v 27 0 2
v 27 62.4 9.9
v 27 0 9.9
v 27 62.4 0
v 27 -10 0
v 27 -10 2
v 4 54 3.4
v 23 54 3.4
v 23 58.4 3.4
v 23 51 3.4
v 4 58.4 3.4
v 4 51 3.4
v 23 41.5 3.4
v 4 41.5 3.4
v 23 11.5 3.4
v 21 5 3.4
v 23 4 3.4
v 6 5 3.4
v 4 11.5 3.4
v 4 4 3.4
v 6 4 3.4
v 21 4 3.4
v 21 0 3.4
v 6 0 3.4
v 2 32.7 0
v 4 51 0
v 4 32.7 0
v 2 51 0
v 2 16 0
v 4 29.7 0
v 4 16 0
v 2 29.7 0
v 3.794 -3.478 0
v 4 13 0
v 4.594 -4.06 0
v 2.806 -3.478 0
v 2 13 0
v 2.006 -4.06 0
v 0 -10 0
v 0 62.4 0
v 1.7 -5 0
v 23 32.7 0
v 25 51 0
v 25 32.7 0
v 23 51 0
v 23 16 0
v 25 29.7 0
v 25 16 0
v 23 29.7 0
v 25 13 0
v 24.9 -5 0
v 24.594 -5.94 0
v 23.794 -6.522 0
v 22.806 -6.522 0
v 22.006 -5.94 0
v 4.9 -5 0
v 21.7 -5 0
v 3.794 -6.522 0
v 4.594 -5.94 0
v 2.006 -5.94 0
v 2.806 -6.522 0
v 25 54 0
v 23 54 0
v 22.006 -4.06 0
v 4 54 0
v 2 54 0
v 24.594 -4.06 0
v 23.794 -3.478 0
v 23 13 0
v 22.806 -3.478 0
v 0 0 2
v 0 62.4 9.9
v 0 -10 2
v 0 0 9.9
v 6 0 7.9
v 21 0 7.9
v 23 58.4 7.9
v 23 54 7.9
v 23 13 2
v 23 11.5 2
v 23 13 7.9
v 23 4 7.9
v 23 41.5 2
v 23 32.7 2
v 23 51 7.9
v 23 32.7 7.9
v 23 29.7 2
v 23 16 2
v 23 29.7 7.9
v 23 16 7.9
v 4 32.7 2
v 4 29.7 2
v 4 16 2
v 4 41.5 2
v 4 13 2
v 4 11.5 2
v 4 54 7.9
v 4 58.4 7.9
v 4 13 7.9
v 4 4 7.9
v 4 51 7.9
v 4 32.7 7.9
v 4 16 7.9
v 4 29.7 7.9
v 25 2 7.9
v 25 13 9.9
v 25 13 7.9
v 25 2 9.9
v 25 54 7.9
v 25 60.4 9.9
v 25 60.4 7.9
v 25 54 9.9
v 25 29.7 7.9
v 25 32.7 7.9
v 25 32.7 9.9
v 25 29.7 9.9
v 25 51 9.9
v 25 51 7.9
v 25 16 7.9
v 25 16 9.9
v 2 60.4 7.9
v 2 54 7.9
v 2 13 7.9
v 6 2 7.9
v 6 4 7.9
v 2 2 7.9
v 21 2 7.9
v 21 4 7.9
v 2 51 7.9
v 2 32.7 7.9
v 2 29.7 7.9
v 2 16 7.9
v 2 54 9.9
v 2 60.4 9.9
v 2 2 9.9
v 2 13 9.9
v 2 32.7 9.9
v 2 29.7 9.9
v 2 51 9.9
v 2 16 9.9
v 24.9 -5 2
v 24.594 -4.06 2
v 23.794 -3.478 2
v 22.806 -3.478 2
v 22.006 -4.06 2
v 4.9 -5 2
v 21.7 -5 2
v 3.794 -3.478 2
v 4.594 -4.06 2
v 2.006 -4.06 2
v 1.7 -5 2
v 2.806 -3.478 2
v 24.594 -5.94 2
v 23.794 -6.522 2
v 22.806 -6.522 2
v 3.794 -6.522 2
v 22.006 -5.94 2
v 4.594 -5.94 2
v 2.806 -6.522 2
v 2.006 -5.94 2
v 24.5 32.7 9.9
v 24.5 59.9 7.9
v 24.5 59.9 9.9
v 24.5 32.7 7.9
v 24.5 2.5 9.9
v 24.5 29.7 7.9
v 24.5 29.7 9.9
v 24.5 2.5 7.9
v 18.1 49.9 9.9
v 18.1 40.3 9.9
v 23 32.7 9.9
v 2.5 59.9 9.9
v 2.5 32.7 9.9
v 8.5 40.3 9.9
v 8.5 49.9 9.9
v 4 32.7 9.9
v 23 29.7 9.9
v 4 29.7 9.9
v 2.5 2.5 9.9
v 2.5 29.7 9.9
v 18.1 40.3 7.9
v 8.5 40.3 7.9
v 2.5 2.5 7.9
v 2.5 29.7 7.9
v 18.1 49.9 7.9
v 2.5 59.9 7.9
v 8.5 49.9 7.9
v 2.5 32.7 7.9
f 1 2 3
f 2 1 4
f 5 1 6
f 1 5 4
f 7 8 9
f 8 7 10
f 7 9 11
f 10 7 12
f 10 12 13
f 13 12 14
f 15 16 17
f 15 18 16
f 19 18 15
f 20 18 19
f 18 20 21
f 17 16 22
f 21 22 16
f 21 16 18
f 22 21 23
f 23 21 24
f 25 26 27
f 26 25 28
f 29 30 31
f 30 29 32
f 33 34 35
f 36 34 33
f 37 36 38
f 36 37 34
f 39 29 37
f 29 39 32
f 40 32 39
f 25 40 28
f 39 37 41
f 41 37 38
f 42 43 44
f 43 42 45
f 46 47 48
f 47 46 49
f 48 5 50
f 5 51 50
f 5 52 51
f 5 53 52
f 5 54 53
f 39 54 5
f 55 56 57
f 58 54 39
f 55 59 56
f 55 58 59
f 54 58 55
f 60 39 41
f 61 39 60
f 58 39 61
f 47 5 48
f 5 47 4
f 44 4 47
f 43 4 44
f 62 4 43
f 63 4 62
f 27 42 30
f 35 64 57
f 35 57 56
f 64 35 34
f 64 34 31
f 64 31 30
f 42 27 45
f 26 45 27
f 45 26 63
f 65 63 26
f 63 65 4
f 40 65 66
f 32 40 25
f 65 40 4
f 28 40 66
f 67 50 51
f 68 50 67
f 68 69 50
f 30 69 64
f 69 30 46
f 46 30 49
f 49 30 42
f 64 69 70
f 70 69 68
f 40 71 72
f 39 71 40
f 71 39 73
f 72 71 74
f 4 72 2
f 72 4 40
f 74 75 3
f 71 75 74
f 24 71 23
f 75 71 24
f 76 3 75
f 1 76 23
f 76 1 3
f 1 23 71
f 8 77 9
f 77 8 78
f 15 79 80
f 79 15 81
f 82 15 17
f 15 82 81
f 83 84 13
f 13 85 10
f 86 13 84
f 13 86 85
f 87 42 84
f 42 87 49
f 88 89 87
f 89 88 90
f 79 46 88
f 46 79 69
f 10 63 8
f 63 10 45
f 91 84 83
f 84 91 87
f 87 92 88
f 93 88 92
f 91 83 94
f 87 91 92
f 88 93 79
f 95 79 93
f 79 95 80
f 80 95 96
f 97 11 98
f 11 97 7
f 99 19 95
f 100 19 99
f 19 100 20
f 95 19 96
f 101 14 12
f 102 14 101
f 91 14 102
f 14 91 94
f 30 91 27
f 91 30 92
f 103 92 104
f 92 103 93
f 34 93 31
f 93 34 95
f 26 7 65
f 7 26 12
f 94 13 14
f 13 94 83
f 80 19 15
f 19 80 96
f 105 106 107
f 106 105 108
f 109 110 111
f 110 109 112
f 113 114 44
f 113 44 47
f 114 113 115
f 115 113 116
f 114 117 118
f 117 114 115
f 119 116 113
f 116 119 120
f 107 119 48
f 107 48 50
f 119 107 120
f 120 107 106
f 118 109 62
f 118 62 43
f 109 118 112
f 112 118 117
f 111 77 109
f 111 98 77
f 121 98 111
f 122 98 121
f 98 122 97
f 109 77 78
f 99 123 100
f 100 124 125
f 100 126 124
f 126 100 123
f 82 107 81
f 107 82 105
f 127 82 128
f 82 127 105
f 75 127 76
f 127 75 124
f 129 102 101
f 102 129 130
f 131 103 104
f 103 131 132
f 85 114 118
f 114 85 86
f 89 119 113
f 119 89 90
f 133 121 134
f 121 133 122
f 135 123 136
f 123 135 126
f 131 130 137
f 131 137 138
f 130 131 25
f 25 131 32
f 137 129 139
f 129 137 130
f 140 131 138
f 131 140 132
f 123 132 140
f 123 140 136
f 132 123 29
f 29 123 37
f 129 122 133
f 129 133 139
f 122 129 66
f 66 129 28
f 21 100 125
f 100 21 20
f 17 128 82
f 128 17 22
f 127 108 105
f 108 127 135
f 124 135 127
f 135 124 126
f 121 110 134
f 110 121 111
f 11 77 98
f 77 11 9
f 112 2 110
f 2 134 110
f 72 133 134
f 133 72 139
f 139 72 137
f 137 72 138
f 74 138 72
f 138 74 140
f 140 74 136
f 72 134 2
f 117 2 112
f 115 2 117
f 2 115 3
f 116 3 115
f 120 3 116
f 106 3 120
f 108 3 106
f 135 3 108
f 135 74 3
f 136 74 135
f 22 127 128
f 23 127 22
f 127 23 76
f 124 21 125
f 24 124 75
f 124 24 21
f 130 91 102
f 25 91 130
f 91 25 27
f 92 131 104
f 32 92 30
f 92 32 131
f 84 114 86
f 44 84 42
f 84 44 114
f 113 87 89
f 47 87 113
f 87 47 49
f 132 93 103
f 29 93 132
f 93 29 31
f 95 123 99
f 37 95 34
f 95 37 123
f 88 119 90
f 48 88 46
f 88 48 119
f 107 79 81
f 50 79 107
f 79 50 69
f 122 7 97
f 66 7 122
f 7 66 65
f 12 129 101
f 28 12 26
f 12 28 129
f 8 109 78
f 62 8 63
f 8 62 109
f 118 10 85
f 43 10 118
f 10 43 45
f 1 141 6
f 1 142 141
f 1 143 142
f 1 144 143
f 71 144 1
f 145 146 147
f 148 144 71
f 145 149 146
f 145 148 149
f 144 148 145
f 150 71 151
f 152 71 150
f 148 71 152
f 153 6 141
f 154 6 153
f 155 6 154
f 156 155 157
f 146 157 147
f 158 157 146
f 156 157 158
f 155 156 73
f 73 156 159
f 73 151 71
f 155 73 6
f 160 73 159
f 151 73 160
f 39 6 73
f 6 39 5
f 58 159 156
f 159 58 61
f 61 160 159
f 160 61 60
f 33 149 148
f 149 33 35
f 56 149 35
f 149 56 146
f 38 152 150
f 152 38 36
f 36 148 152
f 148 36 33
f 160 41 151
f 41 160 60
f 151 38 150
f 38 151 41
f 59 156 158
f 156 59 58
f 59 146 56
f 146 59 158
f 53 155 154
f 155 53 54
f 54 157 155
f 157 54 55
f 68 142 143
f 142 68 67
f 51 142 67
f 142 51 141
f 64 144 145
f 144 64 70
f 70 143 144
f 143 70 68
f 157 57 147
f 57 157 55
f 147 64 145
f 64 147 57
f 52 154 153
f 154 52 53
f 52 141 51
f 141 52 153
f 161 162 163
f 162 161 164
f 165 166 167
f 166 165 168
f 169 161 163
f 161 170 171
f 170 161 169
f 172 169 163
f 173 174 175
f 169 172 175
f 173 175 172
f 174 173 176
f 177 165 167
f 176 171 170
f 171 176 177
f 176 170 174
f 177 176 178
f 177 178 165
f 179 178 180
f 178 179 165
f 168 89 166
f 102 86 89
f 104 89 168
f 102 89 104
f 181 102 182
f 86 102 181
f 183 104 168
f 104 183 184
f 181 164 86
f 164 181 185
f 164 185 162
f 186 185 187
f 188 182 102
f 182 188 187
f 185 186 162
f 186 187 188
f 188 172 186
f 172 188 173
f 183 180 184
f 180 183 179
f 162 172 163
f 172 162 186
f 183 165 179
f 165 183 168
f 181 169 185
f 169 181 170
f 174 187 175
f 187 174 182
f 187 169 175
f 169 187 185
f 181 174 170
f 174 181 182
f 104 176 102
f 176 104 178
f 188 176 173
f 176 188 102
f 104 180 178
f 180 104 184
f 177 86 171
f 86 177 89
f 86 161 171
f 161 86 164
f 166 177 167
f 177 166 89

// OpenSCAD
opi_cam_width = 19.0;
opi_cam_height = 54.4;
opi_cam_depth = 4.5;

opi_cam_bottom_depth = 1.4;
opi_cam_bottom_height = 30.0;
opi_cam_bottom_off_y = 7.5;

opi_lens_width = 8.6;
opi_lens_height = 8.6;
opi_lens_off_x = 5.0;
opi_lens_off_y = 9.0;

cable_cut_width = 15.0;
wall_size = 2.0;

cable_tie_width = 3.0;
cable_tie_height = 2.0;
cable_tie_off_1 = 9.0;
cable_tie_off_2 = 47.0;

screw_holes = 3.2;
screw_plate = 10.0;

lens_gap = 0.5;
top_gap = 0.5;

$fn = 10;

module cam() {
    cube([opi_cam_width, opi_cam_height, opi_cam_depth]);
    
    translate([opi_lens_off_x, opi_cam_height - opi_lens_height - opi_lens_off_y, opi_cam_depth])
        cube([opi_lens_width, opi_lens_height, 5]);
    
    translate([0, opi_cam_bottom_off_y, -opi_cam_bottom_depth])
        cube([opi_cam_width, opi_cam_bottom_height, opi_cam_bottom_depth]);
}

module holder_bottom_walls() {
    difference() {
        cube([opi_cam_width + (4 * wall_size), opi_cam_height + (4 * wall_size), wall_size + opi_cam_bottom_depth]);
        
        translate([2 * wall_size, (2 * wall_size) + opi_cam_bottom_off_y, wall_size])
            cube([opi_cam_width, opi_cam_bottom_height, opi_cam_bottom_depth + 1]);
    }
    
    // inner walls
    translate([wall_size, wall_size, wall_size])
        cube([opi_cam_width + (2 * wall_size), wall_size, opi_cam_depth + opi_cam_bottom_depth]);
    translate([wall_size, opi_cam_height + (2 * wall_size), wall_size])
        cube([opi_cam_width + (2 * wall_size), wall_size, opi_cam_depth + opi_cam_bottom_depth]);
    translate([wall_size, 2 * wall_size, wall_size])
        cube([wall_size, opi_cam_height, opi_cam_depth + opi_cam_bottom_depth]);
    translate([opi_cam_width + (2 * wall_size), 2 * wall_size, wall_size])
        cube([wall_size, opi_cam_height, opi_cam_depth + opi_cam_bottom_depth]);
    
    // outer walls
    translate([0, 0, wall_size])
        cube([opi_cam_width + (4 * wall_size), wall_size, opi_cam_depth + opi_cam_bottom_depth + wall_size]);
    translate([0, opi_cam_height + (3 * wall_size), wall_size])
        cube([opi_cam_width + (4 * wall_size), wall_size, opi_cam_depth + opi_cam_bottom_depth + wall_size]);
    translate([0, wall_size, wall_size])
        cube([wall_size, opi_cam_height + (2 * wall_size), opi_cam_depth + opi_cam_bottom_depth + wall_size]);
    translate([opi_cam_width + (3 * wall_size), wall_size, wall_size])
        cube([wall_size, opi_cam_height + (2 * wall_size), opi_cam_depth + opi_cam_bottom_depth + wall_size]);
}

module screws() {
    difference() {
        cube([(4 * wall_size) + opi_cam_width, screw_plate, wall_size]);
        
        translate([3.3, screw_plate / 2, -1])
            cylinder(d = screw_holes, h = wall_size + 2);
        translate([23.3, screw_plate / 2, -1])
            cylinder(d = screw_holes, h = wall_size + 2);
        //translate([13.3, screw_plate / 2, -1])
        //    cylinder(d = screw_holes, h = wall_size + 2);
        //translate([((4 * wall_size) + opi_cam_width) / 3, screw_plate / 2, -1])
        //    cylinder(d = screw_holes, h = wall_size + 2);
        //translate([((4 * wall_size) + opi_cam_width) * 2 / 3, screw_plate / 2, -1])
        //    cylinder(d = screw_holes, h = wall_size + 2);
    }
}

module holder_bottom() {
    difference() {
        holder_bottom_walls();
        
        // ribbon cable
        translate([((opi_cam_width + (4 * wall_size)) - cable_cut_width) / 2, -1, wall_size + opi_cam_bottom_depth])
            cube([cable_cut_width, (2 * wall_size) + 2, opi_cam_depth]);
        
        // cable-tie center
        translate([wall_size, ((4 * wall_size) + opi_cam_height - cable_tie_width) / 2, -1])
            cube([cable_tie_height, cable_tie_width, (3 * wall_size) + opi_cam_depth + opi_cam_bottom_depth]);
        translate([opi_cam_width + (2 * wall_size), ((4 * wall_size) + opi_cam_height - cable_tie_width) / 2, -1])
            cube([cable_tie_height, cable_tie_width, (3 * wall_size) + opi_cam_depth + opi_cam_bottom_depth]);
        
        // cable-tie bottom
        translate([wall_size, (2 * wall_size) + cable_tie_off_1, -1])
            cube([cable_tie_height, cable_tie_width, (3 * wall_size) + opi_cam_depth + opi_cam_bottom_depth]);
        translate([opi_cam_width + (2 * wall_size), (2 * wall_size) + cable_tie_off_1, -1])
            cube([cable_tie_height, cable_tie_width, (3 * wall_size) + opi_cam_depth + opi_cam_bottom_depth]);
        
        // cable-tie top
        translate([wall_size, (2 * wall_size) + cable_tie_off_2, -1])
            cube([cable_tie_height, cable_tie_width, (3 * wall_size) + opi_cam_depth + opi_cam_bottom_depth]);
        translate([opi_cam_width + (2 * wall_size), (2 * wall_size) + cable_tie_off_2, -1])
            cube([cable_tie_height, cable_tie_width, (3 * wall_size) + opi_cam_depth + opi_cam_bottom_depth]);
    }
    
    translate([0, -screw_plate, 0])
        screws();
}

module holder_top() {
    difference() {
        translate([top_gap, top_gap, 0])
            cube([opi_cam_width + (2 * wall_size) - (2 * top_gap), opi_cam_height + (2 * wall_size) - (2 * top_gap), wall_size]);
        
        // camera lens
        translate([wall_size + opi_lens_off_x - lens_gap, wall_size + opi_cam_height - opi_lens_height - opi_lens_off_y - lens_gap, -1])
        cube([opi_lens_width + (2 * lens_gap), opi_lens_height + (2 * lens_gap), wall_size + 2]);
        
        // cable-tie center
        translate([0, ((2 * wall_size) + opi_cam_height - cable_tie_width) / 2, -1])
            cube([cable_tie_height, cable_tie_width, wall_size + 2]);
        translate([opi_cam_width + wall_size, ((2 * wall_size) + opi_cam_height - cable_tie_width) / 2, -1])
            cube([cable_tie_height, cable_tie_width, wall_size + 2]);
        
        /*
        // cable-tie bottom
        translate([0, wall_size + cable_tie_off_1, -1])
            cube([cable_tie_height, cable_tie_width, wall_size + 2]);
        translate([opi_cam_width + wall_size, wall_size + cable_tie_off_1, -1])
            cube([cable_tie_height, cable_tie_width, wall_size + 2]);
        
        // cable-tie top
        translate([0, wall_size + cable_tie_off_2, -1])
            cube([cable_tie_height, cable_tie_width, wall_size + 2]);
        translate([opi_cam_width + wall_size, wall_size + cable_tie_off_2, -1])
            cube([cable_tie_height, cable_tie_width, wall_size + 2]);
        */
    }
}

module cam_holder() {
    holder_bottom();

    %translate([2 * wall_size, 2 * wall_size, wall_size])
        cam();


    translate([wall_size, wall_size, wall_size + opi_cam_depth + opi_cam_bottom_depth])
        holder_top();
}

cam_holder();
